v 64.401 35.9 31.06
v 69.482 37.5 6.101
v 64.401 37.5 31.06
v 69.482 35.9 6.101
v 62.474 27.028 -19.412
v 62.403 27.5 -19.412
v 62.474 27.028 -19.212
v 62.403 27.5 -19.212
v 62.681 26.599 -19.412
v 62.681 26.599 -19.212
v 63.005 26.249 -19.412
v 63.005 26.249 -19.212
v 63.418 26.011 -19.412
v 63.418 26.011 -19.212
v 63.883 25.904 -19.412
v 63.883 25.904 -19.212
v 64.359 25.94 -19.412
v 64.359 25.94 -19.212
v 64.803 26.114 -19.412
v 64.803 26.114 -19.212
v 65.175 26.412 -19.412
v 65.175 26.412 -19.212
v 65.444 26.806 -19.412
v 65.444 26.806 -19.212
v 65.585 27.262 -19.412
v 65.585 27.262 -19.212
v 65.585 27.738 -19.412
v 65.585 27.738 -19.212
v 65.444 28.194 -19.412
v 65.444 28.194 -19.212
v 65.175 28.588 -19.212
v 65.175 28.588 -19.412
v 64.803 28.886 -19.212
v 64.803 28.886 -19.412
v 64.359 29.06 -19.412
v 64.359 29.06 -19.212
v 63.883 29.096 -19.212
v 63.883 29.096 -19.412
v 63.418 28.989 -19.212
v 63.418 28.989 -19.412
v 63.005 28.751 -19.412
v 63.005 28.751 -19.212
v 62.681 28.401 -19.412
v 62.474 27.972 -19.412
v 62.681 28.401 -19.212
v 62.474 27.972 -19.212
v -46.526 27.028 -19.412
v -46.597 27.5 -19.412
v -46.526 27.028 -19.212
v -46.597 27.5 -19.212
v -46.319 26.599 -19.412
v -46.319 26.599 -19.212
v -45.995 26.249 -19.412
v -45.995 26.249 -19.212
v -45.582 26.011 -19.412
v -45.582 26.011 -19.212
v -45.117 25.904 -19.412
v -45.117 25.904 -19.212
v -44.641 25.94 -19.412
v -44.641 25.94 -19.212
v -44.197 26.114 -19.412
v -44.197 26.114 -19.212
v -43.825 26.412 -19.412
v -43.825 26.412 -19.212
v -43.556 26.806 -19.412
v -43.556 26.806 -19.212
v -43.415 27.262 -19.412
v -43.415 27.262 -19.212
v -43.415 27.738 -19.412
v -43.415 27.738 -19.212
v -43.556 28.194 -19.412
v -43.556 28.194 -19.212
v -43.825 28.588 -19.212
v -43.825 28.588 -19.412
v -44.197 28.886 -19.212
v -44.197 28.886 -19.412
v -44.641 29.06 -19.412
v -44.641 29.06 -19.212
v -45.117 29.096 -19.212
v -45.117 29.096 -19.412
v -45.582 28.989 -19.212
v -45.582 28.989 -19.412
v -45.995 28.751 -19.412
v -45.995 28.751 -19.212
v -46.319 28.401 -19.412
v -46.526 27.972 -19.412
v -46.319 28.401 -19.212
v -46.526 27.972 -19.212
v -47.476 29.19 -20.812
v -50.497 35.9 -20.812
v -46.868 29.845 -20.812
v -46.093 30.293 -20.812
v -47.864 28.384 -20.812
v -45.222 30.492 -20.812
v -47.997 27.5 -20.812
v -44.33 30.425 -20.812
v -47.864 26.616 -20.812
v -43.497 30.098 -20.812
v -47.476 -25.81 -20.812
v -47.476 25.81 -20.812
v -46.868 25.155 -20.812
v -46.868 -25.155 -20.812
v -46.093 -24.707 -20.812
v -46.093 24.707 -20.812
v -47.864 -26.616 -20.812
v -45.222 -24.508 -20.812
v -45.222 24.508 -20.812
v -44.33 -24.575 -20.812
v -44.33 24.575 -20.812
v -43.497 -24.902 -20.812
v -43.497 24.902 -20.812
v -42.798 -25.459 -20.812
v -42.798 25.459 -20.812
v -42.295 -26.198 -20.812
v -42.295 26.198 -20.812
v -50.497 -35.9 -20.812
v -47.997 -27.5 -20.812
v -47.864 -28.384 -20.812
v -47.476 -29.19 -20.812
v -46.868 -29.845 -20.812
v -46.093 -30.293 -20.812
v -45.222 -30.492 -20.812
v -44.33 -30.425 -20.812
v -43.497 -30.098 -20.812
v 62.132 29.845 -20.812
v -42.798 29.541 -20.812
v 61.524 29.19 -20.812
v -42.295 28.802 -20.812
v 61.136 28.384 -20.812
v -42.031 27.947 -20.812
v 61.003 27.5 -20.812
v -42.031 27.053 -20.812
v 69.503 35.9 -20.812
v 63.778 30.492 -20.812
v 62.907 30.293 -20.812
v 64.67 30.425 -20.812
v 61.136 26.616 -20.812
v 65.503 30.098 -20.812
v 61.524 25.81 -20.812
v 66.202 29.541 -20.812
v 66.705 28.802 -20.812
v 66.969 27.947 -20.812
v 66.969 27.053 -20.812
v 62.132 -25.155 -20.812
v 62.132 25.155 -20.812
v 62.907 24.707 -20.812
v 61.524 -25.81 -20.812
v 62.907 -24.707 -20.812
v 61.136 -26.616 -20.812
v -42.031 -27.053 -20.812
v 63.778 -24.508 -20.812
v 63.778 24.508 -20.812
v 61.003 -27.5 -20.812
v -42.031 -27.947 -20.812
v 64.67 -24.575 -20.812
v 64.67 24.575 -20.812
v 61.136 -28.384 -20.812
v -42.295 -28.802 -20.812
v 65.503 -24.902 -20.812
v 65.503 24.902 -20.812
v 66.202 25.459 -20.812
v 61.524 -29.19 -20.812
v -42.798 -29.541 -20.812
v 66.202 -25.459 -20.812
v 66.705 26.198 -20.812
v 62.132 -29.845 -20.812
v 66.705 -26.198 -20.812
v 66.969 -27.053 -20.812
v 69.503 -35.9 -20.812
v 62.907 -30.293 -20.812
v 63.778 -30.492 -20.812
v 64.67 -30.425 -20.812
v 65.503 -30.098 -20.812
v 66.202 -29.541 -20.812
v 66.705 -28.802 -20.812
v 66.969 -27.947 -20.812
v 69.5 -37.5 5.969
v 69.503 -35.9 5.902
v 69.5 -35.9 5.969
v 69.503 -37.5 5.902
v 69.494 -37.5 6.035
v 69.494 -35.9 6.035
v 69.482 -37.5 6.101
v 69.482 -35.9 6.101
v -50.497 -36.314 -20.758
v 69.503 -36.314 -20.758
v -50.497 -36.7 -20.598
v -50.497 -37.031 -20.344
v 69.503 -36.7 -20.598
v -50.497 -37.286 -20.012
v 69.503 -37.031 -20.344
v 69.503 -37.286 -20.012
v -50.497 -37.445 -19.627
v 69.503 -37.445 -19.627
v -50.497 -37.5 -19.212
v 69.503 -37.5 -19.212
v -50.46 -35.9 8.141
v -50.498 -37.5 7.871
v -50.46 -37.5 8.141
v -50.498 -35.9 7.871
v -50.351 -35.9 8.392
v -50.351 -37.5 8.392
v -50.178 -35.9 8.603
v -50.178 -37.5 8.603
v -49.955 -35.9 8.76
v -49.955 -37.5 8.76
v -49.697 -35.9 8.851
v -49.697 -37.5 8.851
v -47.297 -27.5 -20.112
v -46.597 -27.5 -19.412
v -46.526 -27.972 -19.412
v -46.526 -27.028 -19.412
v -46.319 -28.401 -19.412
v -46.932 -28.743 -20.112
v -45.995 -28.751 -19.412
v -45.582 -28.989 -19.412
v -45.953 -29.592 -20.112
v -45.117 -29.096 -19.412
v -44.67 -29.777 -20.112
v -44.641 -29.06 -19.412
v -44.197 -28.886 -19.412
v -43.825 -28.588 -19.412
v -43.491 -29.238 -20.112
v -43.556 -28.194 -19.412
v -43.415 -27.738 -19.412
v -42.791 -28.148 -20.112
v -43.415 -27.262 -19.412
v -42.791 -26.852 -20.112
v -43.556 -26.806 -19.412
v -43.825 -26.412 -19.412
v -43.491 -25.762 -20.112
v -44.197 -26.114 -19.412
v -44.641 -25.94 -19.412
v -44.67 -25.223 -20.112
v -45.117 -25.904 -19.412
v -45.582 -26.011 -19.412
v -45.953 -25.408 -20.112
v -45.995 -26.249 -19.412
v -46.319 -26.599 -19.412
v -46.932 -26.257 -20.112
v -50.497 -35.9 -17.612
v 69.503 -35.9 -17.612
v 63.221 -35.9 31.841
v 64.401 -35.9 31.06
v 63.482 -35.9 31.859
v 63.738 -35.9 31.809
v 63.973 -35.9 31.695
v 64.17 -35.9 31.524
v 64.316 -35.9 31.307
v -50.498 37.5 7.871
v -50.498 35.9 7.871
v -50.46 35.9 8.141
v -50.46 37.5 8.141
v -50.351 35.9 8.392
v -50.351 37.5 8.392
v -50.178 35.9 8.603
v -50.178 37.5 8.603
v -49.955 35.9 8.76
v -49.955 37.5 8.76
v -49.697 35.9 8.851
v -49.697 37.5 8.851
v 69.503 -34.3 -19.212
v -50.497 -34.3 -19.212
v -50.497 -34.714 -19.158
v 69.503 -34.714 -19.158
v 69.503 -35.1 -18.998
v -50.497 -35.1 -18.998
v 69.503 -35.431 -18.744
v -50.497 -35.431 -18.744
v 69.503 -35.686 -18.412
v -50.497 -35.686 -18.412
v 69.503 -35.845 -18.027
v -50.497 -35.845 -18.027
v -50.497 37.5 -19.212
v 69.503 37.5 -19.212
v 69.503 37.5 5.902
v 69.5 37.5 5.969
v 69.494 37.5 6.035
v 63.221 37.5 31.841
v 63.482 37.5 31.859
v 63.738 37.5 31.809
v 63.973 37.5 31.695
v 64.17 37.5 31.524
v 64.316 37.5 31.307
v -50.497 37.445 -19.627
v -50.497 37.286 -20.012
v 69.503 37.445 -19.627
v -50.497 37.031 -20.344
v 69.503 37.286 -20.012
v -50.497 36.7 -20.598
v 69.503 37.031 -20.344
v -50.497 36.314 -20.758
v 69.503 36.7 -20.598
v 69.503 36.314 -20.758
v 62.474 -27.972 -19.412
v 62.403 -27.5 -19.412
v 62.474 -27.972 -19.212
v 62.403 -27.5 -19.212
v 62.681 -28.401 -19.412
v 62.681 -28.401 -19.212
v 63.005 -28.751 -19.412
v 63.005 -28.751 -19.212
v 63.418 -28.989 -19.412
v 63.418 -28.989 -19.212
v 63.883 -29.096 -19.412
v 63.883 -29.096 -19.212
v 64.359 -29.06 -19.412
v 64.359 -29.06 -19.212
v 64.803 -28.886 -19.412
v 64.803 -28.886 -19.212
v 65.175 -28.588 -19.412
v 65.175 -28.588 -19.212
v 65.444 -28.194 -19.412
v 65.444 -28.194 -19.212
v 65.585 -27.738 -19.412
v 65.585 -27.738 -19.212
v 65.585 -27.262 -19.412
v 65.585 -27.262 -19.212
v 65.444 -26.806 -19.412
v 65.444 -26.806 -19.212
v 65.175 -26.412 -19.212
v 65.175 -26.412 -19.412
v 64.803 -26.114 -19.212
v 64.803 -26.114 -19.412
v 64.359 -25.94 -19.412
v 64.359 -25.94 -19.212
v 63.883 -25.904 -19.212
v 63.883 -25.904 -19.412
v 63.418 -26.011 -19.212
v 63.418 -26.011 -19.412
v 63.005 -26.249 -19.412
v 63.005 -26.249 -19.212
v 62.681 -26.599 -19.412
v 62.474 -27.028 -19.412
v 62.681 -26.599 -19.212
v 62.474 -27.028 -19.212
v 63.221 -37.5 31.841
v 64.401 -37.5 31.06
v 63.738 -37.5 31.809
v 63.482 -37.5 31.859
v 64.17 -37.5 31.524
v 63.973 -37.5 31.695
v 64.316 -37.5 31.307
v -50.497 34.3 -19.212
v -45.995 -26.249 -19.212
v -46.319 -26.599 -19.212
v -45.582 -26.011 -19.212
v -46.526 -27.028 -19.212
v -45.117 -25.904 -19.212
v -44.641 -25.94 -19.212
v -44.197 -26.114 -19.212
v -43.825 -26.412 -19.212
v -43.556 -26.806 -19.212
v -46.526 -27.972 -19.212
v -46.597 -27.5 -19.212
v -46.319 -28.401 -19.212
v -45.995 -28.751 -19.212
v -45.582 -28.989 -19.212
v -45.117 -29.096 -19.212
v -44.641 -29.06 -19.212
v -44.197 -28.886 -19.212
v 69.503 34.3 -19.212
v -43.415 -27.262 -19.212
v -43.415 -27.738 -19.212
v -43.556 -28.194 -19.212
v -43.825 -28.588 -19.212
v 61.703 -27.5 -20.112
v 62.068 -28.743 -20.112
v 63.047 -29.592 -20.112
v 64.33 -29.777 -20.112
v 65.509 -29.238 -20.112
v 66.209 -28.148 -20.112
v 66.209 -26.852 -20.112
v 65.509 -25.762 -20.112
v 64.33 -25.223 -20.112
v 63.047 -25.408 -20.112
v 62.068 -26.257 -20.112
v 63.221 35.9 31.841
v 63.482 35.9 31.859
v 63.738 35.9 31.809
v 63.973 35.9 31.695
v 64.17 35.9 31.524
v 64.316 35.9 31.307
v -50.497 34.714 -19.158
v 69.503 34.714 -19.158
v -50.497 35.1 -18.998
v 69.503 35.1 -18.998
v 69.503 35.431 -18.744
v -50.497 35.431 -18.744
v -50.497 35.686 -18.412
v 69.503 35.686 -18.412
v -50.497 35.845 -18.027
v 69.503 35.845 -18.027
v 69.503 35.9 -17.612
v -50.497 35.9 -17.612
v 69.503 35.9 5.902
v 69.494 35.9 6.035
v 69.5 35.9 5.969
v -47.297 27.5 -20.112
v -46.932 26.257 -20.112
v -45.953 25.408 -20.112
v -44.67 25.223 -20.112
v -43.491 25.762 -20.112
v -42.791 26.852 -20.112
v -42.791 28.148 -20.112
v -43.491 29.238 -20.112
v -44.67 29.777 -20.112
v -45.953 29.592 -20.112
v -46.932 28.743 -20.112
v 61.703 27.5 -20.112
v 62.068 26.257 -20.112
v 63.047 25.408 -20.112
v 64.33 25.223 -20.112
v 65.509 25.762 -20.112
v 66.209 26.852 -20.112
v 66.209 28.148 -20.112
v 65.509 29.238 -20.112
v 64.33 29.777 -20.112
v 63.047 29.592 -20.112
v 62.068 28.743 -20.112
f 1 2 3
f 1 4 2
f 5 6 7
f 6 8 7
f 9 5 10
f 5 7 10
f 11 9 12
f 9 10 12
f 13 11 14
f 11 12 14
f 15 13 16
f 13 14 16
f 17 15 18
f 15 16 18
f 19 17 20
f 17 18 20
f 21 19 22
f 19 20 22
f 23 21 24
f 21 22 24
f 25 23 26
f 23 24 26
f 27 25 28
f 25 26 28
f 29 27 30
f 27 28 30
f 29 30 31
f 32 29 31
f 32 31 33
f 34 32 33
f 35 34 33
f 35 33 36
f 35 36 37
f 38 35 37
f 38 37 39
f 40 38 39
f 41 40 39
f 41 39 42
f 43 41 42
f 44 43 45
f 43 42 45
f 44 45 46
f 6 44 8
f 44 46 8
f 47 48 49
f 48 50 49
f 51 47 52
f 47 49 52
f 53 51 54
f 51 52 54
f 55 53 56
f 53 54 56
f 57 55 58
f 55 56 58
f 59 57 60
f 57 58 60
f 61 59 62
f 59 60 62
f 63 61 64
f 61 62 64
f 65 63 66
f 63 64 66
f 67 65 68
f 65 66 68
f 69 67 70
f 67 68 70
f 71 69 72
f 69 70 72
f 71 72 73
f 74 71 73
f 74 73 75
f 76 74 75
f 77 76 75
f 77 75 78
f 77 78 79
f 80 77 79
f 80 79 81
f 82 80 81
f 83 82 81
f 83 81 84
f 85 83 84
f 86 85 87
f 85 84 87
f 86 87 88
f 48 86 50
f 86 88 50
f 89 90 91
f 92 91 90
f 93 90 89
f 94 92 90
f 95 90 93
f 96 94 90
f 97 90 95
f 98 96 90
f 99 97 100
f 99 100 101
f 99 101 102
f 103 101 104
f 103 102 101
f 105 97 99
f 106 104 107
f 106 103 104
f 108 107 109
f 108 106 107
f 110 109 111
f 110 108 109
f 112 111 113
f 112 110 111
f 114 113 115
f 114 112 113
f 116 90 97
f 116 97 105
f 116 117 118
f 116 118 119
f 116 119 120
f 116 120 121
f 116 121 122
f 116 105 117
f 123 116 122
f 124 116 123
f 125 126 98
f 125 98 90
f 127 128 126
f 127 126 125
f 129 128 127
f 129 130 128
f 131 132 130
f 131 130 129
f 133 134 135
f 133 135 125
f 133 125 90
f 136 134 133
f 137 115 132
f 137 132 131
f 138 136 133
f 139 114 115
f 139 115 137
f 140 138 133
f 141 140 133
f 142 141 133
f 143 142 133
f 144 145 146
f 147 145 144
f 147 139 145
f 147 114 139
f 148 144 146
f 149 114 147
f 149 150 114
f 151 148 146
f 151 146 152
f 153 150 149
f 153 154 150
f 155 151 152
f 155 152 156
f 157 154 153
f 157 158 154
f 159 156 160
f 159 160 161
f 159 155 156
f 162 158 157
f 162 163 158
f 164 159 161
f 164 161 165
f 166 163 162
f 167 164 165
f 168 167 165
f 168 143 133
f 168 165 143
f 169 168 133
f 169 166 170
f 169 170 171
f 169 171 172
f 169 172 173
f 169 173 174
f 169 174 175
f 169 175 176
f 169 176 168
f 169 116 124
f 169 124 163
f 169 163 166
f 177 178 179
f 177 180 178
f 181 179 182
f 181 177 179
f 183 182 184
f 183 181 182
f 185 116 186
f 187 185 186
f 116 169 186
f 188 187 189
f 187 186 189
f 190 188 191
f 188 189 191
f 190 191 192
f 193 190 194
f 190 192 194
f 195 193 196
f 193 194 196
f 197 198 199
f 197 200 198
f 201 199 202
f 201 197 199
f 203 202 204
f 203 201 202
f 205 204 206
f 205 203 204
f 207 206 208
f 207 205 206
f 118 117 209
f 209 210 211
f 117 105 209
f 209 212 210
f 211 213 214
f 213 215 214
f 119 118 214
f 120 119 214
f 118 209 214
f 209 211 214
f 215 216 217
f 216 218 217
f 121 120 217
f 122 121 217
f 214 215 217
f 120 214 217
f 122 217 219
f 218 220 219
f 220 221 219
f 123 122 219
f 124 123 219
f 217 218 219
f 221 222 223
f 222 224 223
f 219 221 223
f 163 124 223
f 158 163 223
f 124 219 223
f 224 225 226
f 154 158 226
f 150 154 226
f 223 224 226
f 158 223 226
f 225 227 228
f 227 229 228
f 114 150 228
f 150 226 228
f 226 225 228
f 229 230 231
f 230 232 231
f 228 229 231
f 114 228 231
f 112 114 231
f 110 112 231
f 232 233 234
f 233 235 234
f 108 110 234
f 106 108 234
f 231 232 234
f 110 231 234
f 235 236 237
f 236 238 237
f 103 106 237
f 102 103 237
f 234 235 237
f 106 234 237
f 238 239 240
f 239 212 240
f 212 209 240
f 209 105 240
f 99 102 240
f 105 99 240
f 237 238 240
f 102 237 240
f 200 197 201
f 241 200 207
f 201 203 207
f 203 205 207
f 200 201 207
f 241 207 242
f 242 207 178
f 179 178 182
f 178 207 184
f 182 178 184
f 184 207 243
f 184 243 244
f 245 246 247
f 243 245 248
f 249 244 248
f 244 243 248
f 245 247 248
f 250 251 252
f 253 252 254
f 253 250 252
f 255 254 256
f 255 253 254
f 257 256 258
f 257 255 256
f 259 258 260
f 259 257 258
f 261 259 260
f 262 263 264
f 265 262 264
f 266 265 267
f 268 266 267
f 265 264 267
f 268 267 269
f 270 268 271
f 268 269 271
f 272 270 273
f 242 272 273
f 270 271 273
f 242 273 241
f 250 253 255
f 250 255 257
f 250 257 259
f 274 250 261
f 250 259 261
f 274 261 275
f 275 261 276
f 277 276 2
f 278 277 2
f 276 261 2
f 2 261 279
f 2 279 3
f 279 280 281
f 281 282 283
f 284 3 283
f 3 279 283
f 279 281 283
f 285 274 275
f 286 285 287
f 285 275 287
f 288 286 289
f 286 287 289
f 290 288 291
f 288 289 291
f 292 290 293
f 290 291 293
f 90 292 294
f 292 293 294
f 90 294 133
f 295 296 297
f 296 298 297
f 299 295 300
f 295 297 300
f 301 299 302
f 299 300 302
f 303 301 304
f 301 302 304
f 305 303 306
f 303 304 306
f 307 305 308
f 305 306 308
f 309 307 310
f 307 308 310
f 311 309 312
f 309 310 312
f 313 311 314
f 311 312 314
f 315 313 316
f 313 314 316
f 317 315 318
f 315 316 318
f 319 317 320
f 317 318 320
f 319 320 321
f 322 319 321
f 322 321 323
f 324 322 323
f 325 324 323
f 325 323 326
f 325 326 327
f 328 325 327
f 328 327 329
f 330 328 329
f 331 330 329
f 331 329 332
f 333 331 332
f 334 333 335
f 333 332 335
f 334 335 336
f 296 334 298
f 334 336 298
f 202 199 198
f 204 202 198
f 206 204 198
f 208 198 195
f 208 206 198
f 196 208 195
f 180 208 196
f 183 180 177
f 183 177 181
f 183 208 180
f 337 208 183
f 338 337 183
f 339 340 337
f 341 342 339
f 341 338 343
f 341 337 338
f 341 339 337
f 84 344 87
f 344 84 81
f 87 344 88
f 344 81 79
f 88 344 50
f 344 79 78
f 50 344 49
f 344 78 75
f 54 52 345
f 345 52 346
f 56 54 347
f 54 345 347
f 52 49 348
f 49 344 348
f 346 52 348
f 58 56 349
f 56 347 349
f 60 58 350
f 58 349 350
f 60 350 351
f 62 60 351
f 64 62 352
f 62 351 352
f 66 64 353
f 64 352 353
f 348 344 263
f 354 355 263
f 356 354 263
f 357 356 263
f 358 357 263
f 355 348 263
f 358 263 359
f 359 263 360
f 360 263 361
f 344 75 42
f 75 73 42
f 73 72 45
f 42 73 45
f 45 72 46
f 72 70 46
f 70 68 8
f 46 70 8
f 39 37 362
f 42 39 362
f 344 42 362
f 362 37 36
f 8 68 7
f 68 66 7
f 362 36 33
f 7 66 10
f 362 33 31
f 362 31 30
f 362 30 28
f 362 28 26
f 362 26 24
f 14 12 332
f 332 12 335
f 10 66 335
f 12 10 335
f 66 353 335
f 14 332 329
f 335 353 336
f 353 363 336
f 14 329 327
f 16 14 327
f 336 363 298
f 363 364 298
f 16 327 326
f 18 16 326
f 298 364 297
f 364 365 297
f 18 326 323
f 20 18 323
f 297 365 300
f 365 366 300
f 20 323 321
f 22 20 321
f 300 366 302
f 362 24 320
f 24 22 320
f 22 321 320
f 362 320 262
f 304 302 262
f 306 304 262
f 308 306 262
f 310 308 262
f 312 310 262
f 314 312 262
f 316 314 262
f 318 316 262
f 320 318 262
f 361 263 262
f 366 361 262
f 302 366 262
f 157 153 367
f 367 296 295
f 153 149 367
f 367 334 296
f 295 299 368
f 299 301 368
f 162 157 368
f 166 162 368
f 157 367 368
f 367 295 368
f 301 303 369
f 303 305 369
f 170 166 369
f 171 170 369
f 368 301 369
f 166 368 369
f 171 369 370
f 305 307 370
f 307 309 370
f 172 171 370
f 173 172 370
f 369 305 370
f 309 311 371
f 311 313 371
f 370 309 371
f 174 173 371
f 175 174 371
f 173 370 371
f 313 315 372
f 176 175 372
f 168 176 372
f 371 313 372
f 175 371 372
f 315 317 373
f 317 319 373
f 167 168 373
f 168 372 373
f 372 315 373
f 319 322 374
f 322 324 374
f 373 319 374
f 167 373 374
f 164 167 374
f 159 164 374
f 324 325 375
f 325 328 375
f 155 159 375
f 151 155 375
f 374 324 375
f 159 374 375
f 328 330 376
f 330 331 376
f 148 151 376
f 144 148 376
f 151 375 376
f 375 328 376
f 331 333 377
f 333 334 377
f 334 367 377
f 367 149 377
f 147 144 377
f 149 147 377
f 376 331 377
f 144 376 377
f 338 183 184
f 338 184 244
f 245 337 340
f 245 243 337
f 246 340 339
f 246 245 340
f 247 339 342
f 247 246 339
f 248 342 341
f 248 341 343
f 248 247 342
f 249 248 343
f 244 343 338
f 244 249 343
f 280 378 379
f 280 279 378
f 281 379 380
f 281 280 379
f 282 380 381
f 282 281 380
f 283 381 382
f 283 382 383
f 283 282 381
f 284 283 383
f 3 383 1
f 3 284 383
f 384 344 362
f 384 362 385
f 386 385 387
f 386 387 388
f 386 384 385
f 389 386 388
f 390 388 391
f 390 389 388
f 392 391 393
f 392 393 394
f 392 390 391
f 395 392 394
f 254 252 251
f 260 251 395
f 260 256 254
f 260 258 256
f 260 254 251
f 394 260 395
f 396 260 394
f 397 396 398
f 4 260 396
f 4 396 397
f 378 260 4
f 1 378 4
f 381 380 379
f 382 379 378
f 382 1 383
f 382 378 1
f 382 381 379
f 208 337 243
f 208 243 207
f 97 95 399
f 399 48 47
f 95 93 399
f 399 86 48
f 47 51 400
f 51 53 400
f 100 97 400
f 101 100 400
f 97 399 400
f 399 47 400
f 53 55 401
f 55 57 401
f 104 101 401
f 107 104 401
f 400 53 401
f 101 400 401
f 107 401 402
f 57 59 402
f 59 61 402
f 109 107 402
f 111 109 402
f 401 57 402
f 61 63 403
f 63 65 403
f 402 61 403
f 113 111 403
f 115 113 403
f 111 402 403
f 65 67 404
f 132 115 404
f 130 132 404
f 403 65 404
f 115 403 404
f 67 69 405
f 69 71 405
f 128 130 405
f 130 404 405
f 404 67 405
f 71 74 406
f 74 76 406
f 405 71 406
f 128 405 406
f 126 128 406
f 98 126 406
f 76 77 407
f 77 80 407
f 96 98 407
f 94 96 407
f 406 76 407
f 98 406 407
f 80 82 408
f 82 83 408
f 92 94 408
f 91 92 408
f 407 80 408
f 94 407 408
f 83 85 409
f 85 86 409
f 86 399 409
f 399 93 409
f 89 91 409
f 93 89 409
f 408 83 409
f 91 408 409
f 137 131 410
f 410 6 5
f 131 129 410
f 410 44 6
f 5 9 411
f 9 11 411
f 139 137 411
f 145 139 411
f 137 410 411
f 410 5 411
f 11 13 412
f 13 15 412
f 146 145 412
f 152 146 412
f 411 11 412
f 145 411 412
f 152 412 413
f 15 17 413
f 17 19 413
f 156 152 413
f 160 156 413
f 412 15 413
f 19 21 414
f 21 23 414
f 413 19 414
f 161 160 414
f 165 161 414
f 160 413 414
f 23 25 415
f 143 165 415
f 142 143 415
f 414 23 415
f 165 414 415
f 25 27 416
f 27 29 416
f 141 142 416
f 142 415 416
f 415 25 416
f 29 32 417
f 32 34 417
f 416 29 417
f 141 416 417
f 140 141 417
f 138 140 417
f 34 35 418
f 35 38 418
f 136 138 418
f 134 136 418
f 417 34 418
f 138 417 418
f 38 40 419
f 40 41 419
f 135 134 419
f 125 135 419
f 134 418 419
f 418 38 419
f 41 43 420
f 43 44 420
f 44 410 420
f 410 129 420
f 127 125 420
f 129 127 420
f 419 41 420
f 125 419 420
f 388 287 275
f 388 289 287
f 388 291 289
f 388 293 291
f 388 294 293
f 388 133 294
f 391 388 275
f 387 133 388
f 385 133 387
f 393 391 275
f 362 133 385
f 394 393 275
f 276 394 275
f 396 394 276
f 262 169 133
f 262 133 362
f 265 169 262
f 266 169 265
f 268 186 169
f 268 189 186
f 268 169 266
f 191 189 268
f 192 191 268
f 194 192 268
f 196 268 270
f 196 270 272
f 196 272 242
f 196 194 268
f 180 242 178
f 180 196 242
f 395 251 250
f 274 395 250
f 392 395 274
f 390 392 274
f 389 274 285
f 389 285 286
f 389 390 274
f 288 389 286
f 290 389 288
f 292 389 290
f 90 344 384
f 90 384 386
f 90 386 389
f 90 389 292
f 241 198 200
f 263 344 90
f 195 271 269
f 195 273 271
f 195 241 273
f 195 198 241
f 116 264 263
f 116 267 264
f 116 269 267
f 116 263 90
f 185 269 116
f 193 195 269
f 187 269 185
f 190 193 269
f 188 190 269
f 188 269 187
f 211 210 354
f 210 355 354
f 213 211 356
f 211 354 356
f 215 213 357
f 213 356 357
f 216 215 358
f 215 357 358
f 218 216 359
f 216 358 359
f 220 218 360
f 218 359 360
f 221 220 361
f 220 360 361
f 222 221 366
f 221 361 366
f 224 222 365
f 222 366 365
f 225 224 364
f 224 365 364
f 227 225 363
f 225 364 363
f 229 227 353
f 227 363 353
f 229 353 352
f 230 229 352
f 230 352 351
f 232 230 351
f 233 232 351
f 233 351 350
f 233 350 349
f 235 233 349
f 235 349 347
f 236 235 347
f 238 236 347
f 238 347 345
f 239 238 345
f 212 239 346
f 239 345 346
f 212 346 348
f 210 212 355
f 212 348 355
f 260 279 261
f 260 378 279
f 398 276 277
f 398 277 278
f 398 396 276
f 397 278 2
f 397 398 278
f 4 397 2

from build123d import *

# Parameters (mm, degrees)
F1_DEPTH       = 37.5
F2_T           = -1.6
F3_R           = 1.6
F5_D           = 3.2
F5_CSINK_D     = 6
F5_CSINK_ANGLE = 90
F6_R           = 1.6
F7_R           = 1


# Not quite as in the source:
# - a feature names something its author has since deleted; it is built from what else it names


with BuildPart() as f1:
    # F0 (on Front) → F1 (new body, symmetric)
    with BuildSketch(Plane.XZ):
        Polygon((-50.4974494928, -20.8124593111), (69.5025505072, -20.8124593111), (69.5025505072, 6.0025406889), (64.2012187523, 32.0403523478), (-50.4975286176, 8.6875406888), align=None)
    extrude(amount=F1_DEPTH, both=True)

    # F2
    f2_openings = [f1.faces().sort_by_distance(p)[0] for p in [
        (-50.497489, 0, -6.062459),
        (6.851845, 0, 20.363947),
        (66.851885, 0, 19.021447),
        (69.502551, 0, -7.404959),
    ]]
    offset(amount=F2_T, openings=f2_openings, kind=Kind.INTERSECTION)

    # F3
    f3_edges = [f1.edges().sort_by_distance(p)[0] for p in [
        (9.502548, -35.9, -19.212459),
        (9.502548, 35.9, -19.212459),
    ]]
    fillet(f3_edges, radius=F3_R)

    # F5 (through all)
    with Locations(Plane(origin=(0, 0, -20.8124593111), x_dir=(1, 0, 0), z_dir=(0, 0, -1))):
        with Locations((64.0025505072, -27.5), (-44.9974494928, -27.5), (64.0025505072, 27.5), (-44.9974494928, 27.5)):
            CounterSinkHole(F5_D / 2, F5_CSINK_D / 2, counter_sink_angle=F5_CSINK_ANGLE)

    # F6
    f6_edges = [f1.edges().sort_by_distance(p)[0] for p in [
        (9.502551, 37.5, -20.812459),
        (9.502551, -37.5, -20.812459),
    ]]
    fillet(f6_edges, radius=F6_R)

    # F7
    f7_edges = [f1.edges().sort_by_distance(p)[0] for p in [
        (64.201219, -36.7, 32.040352),
        (64.201219, 36.7, 32.040352),
        (69.502551, 36.7, 6.002541),
        (69.502551, -36.7, 6.002541),
        (-50.497529, -36.7, 8.687541),
        (-50.497529, 36.7, 8.687541),
    ]]
    fillet(f7_edges, radius=F7_R)


solid = f1.part
